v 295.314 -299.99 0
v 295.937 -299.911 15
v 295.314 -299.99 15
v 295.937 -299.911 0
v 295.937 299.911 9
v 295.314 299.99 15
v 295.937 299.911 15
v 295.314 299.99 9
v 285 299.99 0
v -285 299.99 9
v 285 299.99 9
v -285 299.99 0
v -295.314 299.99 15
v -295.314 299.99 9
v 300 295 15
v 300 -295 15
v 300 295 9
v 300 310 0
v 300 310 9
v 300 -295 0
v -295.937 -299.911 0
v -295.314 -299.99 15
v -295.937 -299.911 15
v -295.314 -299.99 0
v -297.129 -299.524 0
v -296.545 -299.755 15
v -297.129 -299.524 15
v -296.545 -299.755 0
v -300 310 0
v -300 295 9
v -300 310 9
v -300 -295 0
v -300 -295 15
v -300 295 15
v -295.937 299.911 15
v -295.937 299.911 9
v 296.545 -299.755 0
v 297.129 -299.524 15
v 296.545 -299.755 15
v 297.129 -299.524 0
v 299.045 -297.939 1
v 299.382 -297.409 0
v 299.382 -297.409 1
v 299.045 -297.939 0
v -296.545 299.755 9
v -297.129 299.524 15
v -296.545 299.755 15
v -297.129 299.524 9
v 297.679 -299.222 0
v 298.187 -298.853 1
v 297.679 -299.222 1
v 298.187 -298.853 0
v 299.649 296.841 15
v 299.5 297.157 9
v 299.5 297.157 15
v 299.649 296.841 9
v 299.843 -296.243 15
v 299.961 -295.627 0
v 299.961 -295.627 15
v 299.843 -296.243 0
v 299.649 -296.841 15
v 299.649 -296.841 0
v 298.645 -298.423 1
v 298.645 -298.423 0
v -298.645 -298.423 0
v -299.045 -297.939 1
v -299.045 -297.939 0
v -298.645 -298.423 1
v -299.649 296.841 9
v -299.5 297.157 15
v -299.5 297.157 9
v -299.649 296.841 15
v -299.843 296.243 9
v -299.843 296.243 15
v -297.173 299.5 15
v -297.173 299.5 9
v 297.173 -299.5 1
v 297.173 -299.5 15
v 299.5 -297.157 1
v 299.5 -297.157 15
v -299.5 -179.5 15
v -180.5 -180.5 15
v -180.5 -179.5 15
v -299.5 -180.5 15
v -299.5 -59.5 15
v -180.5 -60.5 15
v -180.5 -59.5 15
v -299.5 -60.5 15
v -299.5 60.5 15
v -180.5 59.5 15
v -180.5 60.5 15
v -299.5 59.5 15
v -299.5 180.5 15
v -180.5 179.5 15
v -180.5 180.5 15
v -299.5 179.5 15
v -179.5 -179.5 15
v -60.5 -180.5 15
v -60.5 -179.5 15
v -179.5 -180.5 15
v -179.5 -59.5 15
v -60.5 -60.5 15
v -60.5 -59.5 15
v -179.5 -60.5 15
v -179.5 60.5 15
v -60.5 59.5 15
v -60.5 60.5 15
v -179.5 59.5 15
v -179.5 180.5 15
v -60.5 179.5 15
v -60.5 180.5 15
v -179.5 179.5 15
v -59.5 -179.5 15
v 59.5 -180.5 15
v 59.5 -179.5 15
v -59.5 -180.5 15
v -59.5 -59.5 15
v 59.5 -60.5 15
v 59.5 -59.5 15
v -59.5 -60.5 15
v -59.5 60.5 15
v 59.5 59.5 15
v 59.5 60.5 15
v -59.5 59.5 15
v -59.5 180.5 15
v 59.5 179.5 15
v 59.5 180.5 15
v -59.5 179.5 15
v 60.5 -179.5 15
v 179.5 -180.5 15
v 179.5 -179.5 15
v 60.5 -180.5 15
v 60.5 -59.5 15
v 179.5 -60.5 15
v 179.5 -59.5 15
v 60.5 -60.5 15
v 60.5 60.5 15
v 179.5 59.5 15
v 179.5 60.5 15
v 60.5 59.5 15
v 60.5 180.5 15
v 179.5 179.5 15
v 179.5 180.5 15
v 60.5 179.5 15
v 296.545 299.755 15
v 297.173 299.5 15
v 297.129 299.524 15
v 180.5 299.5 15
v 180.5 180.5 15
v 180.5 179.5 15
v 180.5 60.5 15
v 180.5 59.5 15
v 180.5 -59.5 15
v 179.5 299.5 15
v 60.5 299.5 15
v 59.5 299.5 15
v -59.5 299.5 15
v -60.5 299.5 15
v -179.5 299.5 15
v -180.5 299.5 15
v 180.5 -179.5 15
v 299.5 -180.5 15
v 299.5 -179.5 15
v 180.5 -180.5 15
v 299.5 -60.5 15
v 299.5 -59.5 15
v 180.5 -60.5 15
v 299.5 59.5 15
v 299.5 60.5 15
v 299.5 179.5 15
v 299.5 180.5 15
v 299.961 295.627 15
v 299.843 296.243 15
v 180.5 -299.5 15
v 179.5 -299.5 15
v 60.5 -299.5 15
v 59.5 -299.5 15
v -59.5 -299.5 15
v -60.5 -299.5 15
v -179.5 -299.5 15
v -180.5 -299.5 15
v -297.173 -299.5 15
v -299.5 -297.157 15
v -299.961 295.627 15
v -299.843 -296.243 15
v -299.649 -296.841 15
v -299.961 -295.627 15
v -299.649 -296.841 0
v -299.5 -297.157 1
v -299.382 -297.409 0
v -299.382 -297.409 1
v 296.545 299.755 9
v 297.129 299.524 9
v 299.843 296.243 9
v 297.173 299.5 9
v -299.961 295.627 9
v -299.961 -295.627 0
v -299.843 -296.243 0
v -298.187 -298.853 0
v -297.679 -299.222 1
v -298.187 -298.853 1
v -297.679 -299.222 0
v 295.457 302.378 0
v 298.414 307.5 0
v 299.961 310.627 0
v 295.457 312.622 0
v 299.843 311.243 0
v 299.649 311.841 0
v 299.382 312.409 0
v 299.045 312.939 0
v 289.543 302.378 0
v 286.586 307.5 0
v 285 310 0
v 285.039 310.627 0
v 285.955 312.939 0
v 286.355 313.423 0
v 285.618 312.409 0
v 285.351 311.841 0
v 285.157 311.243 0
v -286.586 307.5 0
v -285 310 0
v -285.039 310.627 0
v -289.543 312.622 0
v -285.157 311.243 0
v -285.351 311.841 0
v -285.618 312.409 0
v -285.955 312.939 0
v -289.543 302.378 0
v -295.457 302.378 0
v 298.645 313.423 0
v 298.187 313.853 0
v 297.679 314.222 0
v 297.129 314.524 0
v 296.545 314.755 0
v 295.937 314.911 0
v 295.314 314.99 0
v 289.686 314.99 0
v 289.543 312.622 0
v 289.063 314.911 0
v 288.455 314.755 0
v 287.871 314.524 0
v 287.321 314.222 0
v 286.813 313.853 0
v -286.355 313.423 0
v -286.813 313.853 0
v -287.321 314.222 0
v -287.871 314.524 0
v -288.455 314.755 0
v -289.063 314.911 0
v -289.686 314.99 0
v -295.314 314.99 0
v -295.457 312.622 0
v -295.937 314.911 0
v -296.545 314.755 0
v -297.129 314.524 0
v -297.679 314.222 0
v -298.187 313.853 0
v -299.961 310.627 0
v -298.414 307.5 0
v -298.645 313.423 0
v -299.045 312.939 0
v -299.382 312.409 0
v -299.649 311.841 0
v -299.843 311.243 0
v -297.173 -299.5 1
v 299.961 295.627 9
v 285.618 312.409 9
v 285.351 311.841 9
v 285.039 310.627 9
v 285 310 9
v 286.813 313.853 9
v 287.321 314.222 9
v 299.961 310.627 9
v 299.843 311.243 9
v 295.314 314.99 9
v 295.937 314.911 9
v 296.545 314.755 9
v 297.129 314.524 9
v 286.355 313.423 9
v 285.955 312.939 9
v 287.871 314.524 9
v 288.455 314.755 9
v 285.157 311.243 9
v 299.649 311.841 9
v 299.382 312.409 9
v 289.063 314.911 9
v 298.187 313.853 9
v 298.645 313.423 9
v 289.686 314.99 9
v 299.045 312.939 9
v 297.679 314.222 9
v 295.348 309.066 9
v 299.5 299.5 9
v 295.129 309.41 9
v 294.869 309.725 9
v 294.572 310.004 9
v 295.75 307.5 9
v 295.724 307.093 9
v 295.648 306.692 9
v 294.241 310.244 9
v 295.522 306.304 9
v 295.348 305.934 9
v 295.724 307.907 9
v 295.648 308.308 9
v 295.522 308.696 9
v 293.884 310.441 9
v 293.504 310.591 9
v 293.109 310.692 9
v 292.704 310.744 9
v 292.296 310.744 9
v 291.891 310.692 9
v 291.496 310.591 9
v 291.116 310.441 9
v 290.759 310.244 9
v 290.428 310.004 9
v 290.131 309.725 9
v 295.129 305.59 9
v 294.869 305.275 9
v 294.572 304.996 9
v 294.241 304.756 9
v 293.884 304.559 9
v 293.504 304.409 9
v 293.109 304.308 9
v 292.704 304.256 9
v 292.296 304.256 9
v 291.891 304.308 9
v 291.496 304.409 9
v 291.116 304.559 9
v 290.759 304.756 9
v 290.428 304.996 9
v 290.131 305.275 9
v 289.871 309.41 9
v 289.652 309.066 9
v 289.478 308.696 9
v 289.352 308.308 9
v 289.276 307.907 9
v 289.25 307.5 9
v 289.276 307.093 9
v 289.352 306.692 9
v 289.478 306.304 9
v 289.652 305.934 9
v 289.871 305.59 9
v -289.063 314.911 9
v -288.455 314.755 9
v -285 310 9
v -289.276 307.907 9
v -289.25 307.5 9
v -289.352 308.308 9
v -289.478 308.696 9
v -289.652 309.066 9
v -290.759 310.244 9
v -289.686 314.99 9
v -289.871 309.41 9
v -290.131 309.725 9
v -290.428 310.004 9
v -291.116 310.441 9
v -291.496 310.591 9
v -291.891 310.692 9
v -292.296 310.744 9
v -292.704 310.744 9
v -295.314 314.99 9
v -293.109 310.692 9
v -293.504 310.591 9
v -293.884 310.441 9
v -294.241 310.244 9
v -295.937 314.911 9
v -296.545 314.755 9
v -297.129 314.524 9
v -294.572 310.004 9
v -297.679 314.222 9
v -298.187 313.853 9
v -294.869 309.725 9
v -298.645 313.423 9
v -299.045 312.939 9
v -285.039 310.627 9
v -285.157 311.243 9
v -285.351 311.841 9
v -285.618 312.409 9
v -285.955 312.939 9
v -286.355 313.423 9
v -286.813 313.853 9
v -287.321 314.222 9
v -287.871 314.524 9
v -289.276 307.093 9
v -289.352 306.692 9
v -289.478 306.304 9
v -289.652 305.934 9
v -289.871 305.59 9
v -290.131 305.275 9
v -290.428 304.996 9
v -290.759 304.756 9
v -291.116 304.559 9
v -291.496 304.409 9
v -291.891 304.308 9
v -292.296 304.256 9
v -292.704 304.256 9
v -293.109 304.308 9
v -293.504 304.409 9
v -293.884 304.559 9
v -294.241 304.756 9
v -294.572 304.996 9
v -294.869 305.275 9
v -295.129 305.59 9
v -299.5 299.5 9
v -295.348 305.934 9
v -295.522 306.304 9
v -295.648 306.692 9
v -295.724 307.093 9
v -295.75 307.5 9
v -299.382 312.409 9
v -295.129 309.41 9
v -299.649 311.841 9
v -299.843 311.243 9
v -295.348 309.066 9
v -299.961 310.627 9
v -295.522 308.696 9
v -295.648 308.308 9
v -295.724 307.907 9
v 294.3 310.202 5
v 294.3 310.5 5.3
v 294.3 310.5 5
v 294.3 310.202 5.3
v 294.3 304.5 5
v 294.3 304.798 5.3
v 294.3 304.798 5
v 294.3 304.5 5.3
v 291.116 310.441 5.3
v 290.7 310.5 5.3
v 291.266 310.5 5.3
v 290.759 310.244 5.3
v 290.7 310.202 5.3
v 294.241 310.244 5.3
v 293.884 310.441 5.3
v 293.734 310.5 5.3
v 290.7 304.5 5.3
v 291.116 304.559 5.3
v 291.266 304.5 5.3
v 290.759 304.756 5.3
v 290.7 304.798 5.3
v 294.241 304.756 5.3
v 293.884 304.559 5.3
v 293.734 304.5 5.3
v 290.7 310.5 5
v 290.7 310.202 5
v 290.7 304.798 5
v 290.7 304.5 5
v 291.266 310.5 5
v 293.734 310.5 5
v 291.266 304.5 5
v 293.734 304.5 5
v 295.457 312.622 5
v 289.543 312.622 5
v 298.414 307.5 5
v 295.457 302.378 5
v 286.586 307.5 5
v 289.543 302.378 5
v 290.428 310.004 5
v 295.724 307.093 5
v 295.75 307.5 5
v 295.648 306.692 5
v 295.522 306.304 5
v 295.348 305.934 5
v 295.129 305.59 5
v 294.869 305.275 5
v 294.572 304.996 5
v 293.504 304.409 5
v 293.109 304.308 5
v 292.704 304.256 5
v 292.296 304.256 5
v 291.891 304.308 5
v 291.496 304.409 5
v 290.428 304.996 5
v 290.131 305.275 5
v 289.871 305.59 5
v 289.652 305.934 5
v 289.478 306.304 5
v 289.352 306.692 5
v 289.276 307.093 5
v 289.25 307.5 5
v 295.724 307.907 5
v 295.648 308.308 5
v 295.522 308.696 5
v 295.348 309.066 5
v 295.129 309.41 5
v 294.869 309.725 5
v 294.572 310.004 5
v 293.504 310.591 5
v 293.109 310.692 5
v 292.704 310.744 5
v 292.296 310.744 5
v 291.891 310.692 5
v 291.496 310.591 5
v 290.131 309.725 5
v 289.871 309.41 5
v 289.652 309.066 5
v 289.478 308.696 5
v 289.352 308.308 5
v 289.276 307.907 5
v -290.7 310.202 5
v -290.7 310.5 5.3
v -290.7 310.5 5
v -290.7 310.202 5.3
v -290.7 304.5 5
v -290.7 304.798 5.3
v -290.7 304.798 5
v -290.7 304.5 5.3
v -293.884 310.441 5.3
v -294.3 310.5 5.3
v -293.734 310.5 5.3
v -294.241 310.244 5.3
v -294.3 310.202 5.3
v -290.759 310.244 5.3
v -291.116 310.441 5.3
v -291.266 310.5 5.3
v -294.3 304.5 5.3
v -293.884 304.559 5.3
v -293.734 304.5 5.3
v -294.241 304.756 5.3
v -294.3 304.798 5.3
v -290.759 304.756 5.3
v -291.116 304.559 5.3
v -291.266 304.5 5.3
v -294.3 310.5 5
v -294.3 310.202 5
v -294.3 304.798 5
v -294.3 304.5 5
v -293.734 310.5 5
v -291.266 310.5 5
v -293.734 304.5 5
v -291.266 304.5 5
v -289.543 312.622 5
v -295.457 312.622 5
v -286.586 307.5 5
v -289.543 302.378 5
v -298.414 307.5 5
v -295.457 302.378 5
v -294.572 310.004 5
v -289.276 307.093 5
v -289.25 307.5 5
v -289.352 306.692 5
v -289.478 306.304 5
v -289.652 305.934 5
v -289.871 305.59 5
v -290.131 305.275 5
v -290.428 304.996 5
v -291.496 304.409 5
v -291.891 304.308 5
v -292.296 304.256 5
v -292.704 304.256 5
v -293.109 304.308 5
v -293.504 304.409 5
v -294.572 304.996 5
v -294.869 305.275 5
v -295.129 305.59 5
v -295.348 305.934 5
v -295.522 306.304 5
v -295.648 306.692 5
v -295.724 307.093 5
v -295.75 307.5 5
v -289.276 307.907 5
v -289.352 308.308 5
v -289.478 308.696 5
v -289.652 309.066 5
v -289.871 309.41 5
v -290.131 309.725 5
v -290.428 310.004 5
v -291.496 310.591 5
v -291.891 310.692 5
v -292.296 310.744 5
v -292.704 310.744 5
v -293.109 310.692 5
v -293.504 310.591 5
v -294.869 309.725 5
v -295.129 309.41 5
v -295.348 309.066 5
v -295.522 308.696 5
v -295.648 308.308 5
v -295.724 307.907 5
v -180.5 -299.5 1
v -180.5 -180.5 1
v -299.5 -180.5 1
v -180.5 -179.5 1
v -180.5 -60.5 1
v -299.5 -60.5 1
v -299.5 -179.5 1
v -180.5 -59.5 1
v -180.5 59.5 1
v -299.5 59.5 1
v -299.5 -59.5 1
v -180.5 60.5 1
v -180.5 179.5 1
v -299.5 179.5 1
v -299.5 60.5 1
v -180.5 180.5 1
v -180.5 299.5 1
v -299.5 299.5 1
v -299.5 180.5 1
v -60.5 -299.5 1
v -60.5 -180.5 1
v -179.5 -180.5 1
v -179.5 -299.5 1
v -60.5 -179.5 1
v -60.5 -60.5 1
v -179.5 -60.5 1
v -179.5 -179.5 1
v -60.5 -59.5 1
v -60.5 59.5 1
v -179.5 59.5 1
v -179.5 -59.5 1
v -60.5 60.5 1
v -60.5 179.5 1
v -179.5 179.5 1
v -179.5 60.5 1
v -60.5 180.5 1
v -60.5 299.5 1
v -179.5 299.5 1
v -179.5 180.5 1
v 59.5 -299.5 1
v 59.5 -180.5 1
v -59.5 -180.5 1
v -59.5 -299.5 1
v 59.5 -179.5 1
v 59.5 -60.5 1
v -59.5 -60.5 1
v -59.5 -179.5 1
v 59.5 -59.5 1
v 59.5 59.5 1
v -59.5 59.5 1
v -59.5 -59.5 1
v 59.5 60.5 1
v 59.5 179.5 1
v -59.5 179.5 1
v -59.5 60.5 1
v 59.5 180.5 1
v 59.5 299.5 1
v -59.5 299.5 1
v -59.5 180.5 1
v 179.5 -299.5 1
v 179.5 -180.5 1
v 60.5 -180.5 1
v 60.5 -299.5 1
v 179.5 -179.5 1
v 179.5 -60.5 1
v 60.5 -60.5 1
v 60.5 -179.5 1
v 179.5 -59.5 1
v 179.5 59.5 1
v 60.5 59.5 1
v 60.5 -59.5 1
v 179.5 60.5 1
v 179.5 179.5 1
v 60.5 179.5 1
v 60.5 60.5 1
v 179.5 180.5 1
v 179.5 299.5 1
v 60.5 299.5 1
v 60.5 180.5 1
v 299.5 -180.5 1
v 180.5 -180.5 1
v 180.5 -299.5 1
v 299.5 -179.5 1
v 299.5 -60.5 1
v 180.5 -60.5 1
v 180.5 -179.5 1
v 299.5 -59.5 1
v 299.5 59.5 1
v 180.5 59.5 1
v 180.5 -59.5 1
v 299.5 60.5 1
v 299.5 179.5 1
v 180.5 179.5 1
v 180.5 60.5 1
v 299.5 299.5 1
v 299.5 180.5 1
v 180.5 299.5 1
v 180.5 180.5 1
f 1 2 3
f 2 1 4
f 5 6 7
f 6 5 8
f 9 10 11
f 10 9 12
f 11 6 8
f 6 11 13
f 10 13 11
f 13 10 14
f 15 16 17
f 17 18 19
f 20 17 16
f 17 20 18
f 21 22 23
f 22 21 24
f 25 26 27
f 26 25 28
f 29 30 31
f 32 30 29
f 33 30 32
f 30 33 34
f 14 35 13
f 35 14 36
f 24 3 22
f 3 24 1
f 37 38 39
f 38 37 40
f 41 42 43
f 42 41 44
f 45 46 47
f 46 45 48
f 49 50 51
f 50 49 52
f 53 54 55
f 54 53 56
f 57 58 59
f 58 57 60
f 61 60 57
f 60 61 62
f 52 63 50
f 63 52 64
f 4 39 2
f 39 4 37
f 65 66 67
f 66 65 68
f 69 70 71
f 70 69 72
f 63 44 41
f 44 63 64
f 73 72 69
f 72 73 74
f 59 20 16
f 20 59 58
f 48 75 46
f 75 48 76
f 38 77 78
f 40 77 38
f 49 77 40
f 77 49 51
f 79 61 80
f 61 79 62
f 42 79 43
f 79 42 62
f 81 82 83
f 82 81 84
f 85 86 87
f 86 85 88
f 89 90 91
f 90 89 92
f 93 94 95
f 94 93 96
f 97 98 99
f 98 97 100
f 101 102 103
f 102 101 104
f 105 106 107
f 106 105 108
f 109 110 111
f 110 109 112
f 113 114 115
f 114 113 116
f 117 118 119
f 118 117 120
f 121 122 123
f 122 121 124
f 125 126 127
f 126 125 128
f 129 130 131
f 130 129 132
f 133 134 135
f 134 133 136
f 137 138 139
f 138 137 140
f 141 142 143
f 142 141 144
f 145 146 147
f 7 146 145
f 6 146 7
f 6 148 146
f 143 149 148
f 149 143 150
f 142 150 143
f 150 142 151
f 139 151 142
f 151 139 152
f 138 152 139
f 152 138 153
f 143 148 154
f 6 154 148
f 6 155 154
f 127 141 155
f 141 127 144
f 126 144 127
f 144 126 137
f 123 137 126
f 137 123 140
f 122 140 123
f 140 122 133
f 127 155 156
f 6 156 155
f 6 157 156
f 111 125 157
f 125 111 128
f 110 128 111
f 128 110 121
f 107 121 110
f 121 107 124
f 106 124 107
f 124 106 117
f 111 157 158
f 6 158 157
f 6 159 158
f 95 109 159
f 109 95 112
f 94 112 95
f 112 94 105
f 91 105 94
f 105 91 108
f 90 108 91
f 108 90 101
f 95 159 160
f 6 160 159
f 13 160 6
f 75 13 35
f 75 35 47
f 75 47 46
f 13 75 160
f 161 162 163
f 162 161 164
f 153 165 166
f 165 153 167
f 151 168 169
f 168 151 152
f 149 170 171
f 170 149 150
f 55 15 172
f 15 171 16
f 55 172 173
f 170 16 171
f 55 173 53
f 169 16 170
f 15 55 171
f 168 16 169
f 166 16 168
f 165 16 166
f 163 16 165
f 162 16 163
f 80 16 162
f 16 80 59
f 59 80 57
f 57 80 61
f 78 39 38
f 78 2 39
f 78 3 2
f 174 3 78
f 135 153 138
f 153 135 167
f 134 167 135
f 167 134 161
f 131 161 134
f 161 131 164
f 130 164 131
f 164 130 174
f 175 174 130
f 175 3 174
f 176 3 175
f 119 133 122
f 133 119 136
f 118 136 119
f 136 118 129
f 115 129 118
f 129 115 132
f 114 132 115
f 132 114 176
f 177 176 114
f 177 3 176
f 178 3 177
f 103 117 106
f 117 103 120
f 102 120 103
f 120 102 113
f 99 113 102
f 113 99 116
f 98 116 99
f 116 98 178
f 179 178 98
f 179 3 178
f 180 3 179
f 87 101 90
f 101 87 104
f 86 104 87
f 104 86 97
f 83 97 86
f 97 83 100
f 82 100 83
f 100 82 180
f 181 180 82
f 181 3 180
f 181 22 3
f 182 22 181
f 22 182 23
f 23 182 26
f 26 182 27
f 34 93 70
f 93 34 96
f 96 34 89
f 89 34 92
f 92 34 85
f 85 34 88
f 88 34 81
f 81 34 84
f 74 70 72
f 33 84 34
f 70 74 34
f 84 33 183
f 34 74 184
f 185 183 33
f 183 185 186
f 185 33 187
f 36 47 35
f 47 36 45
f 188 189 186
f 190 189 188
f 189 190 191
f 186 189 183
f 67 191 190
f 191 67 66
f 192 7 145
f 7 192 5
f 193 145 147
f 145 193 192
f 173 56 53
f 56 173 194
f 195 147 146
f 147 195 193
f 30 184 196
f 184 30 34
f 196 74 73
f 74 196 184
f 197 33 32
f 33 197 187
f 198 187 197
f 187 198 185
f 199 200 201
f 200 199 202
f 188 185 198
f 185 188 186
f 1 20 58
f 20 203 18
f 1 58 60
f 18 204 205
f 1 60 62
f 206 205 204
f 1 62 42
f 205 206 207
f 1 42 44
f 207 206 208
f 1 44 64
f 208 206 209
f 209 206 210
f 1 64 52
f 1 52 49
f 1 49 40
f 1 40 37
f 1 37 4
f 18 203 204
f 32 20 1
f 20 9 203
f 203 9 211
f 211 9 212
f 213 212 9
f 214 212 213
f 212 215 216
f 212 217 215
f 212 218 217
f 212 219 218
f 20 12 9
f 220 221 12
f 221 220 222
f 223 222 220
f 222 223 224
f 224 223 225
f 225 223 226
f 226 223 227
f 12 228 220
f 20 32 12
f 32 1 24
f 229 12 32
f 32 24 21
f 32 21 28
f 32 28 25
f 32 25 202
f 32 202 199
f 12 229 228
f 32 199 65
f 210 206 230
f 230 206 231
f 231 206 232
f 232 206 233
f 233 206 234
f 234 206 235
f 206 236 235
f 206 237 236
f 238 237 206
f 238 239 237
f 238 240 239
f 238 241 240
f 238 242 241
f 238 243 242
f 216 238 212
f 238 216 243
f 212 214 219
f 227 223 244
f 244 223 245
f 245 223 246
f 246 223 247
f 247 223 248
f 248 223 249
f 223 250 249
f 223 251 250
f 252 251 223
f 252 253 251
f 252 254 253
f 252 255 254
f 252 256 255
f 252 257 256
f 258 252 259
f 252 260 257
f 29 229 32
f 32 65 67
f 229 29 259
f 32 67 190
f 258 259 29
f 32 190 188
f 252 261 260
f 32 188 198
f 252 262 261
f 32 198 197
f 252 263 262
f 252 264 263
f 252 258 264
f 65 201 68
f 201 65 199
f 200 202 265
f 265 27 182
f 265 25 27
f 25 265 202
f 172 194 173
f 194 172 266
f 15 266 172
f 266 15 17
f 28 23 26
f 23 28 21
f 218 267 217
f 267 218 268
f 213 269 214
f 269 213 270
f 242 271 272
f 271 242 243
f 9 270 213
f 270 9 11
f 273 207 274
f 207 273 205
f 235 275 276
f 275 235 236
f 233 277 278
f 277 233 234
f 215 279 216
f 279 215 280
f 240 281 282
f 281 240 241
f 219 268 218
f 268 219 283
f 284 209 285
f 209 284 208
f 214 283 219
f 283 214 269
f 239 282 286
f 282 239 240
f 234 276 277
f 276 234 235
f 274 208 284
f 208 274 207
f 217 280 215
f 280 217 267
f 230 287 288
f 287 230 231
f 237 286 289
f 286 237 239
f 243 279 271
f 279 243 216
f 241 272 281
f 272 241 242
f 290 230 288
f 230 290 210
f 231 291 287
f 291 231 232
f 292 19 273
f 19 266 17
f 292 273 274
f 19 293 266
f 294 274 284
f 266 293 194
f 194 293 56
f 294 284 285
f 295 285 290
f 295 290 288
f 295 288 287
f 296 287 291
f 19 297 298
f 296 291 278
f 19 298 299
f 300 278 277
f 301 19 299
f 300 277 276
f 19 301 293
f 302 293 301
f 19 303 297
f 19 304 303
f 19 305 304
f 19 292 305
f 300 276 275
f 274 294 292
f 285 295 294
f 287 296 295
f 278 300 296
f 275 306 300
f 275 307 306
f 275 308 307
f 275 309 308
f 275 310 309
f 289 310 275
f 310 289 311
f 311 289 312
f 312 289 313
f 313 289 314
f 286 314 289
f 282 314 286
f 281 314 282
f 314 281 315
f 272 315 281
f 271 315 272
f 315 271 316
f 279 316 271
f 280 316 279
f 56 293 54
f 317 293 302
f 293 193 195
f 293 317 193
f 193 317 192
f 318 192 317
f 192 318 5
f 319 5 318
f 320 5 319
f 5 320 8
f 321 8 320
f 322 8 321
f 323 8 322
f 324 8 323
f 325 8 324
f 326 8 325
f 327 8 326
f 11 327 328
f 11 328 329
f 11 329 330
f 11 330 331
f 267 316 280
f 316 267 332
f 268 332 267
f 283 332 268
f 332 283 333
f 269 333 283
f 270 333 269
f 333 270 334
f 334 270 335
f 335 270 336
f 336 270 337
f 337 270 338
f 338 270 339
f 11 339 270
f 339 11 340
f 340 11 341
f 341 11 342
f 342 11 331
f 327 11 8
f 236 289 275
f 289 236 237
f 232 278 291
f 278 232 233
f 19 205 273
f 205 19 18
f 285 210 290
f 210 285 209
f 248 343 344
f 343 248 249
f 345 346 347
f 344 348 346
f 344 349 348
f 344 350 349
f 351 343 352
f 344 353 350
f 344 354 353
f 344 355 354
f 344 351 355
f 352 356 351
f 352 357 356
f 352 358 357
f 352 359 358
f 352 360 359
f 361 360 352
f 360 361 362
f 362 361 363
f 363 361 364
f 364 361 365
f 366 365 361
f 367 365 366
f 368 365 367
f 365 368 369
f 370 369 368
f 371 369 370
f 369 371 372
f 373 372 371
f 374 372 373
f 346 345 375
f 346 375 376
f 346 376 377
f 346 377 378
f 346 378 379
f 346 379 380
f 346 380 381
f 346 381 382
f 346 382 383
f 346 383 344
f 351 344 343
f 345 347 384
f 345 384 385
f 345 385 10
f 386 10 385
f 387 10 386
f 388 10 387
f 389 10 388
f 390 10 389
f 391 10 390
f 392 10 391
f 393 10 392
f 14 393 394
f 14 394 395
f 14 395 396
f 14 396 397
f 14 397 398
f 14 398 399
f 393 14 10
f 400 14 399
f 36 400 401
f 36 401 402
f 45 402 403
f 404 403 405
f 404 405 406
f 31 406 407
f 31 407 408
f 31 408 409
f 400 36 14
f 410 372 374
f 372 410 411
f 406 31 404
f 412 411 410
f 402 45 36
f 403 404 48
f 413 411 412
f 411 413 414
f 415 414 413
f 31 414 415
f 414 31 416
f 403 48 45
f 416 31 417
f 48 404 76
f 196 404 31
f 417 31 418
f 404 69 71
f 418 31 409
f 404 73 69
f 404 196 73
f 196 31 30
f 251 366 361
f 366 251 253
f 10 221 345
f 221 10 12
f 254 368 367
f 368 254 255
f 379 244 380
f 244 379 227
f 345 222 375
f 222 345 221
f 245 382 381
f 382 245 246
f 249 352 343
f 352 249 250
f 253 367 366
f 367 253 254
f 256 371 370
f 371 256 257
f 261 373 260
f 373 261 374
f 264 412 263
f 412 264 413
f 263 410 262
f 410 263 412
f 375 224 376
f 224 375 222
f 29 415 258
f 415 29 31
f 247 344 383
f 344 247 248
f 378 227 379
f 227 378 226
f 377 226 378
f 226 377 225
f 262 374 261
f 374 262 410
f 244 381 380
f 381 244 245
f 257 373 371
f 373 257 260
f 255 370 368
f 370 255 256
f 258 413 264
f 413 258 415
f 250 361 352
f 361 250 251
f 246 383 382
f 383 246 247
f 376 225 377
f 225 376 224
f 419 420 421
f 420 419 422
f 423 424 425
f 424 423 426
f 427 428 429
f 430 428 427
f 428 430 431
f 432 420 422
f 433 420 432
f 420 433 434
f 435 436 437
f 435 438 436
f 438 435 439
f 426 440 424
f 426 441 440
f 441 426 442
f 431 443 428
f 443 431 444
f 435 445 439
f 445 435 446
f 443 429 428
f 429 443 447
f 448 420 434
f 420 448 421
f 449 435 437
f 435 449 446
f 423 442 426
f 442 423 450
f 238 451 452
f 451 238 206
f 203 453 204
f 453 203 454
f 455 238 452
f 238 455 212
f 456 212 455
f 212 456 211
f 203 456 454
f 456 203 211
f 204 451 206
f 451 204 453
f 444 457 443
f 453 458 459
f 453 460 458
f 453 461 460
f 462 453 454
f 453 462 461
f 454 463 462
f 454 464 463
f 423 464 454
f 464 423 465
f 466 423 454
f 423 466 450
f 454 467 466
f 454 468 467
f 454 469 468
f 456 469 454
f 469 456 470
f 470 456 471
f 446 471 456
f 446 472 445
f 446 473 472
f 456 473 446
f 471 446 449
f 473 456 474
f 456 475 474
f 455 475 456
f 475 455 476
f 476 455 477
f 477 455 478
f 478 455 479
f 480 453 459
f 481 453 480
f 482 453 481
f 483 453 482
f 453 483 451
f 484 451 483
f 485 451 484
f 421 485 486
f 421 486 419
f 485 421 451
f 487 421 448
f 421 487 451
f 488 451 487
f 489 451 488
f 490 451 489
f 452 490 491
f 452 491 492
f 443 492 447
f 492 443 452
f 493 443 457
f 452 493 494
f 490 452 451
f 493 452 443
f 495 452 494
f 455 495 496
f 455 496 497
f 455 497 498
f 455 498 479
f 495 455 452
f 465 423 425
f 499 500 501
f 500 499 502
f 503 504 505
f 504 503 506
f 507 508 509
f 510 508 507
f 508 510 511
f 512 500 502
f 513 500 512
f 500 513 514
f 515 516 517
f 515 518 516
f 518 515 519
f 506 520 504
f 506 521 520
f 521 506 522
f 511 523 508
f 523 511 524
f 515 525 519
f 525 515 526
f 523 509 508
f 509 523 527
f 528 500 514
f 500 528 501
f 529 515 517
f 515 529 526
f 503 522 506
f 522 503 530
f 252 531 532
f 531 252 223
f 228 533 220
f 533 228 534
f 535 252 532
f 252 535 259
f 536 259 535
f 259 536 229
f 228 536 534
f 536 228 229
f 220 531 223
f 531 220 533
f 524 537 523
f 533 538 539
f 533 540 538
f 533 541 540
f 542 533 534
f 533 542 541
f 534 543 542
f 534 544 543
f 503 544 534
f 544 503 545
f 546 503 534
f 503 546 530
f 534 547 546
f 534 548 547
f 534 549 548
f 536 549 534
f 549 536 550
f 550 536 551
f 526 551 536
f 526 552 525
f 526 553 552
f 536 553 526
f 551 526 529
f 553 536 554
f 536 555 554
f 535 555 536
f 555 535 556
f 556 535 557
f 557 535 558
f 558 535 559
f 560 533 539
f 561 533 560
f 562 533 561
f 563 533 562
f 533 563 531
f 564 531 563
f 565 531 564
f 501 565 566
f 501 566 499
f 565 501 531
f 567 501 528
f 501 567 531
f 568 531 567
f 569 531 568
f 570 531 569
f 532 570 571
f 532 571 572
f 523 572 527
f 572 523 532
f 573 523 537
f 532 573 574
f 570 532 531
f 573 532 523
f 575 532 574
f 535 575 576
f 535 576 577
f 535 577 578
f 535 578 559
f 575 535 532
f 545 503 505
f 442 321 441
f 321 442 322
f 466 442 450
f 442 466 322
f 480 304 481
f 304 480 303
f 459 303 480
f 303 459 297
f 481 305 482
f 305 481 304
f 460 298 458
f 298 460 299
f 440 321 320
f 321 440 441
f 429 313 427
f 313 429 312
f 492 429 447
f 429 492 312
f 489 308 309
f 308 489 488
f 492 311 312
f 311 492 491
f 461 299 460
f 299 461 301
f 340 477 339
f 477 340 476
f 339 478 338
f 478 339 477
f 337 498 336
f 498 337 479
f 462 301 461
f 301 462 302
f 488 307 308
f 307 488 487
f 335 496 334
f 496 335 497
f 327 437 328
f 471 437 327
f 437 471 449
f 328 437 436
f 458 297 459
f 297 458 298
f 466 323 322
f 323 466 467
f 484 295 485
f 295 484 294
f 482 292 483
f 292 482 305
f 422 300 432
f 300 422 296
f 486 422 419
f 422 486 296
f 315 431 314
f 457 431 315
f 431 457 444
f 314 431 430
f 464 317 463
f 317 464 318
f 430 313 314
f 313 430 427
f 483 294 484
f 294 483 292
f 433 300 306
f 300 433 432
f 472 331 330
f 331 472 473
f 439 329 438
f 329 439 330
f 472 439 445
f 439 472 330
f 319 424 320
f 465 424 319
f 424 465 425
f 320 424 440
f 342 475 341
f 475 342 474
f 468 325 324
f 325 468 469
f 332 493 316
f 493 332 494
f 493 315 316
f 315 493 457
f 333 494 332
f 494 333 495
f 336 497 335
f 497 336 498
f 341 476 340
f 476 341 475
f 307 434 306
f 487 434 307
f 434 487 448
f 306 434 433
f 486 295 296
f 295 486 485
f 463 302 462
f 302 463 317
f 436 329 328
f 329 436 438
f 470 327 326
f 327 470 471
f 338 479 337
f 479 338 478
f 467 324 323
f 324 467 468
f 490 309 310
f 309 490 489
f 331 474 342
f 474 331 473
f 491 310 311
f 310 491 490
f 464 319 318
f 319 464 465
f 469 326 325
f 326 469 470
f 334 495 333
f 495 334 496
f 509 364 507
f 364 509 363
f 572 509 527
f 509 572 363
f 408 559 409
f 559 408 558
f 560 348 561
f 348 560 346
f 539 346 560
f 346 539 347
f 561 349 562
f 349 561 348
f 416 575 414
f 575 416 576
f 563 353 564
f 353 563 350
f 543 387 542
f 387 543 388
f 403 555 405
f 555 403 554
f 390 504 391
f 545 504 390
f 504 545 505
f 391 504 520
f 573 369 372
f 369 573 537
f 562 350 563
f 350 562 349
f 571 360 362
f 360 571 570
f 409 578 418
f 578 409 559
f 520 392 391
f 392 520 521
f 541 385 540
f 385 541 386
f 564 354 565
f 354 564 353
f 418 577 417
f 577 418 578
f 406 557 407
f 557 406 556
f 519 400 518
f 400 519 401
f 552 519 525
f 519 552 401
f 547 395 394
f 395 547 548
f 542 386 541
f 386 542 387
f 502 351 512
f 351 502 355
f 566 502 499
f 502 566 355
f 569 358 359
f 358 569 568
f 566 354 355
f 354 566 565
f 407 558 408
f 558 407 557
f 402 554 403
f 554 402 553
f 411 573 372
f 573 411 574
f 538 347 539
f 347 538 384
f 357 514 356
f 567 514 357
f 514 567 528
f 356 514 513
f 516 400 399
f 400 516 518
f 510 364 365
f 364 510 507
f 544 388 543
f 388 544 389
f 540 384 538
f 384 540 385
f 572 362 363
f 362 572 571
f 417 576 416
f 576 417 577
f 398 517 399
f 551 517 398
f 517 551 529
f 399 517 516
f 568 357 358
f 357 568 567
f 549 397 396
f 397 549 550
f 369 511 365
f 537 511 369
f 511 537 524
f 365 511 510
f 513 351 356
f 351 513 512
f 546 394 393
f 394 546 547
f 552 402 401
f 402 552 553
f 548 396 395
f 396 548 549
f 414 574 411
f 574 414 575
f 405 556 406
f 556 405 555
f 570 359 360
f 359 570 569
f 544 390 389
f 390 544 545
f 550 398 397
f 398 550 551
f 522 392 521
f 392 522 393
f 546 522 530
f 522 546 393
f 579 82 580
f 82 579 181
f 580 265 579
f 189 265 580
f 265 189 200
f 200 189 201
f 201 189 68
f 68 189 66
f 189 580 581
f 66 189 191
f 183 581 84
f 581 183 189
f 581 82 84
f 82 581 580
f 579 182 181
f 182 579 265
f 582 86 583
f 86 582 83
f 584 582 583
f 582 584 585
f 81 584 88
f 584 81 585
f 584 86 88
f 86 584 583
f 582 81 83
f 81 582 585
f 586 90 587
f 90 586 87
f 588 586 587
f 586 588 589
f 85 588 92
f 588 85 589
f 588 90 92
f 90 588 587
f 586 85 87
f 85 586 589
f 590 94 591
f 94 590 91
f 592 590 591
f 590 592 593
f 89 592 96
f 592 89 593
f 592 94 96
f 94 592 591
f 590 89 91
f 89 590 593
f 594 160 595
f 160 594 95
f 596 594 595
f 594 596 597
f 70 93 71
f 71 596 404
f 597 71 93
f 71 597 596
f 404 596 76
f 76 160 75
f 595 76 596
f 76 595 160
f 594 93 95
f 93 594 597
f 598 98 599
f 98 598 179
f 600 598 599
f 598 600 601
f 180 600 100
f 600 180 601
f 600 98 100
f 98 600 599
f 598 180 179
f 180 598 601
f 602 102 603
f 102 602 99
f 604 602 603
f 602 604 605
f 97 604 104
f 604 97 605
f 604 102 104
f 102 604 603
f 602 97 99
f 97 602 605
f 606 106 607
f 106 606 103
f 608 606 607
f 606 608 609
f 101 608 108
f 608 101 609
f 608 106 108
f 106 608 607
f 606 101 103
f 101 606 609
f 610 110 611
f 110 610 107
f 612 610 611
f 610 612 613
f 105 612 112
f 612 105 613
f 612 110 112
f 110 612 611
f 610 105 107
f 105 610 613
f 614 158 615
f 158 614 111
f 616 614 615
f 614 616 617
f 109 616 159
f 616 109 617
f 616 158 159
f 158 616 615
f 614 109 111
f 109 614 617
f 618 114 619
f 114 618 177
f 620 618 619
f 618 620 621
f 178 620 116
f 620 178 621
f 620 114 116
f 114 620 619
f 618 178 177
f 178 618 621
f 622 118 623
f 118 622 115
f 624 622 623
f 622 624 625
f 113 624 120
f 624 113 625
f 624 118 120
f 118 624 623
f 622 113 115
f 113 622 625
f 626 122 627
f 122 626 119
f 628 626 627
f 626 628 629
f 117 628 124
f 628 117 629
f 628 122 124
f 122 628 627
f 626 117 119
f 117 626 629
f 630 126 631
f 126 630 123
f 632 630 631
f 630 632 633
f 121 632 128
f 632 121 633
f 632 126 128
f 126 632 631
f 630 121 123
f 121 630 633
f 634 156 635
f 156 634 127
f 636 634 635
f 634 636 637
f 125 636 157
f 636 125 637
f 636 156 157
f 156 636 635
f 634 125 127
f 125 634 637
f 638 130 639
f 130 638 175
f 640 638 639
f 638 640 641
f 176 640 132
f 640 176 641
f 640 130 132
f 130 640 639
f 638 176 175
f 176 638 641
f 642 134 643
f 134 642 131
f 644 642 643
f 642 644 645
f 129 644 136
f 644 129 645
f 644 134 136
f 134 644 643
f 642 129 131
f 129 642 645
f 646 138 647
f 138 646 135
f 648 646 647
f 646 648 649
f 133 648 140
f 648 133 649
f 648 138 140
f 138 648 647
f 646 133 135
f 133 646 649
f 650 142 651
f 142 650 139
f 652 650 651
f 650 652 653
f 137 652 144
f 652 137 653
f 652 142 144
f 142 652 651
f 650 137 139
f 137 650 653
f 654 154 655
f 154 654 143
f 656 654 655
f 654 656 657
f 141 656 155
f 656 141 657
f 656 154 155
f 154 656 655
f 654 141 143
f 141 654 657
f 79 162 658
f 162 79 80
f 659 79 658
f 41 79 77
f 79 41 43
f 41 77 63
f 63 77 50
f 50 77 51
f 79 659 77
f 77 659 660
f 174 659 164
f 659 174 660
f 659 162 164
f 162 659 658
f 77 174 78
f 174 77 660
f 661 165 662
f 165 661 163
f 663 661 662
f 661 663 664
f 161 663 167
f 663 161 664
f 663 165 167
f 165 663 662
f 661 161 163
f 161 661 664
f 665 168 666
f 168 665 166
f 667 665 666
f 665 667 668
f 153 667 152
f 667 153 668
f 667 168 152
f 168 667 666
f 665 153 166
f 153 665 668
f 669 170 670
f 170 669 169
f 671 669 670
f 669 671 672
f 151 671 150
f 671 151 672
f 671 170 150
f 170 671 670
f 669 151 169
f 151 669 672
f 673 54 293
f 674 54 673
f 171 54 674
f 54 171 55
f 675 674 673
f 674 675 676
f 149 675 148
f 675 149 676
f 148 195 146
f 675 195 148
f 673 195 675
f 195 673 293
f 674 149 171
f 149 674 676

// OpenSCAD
$fn = 50;


difference() {
	union() {
		hull() {
			translate(v = [-295.0000000000, 295.0000000000, 0]) {
				cylinder(h = 15, r = 5);
			}
			translate(v = [295.0000000000, 295.0000000000, 0]) {
				cylinder(h = 15, r = 5);
			}
			translate(v = [-295.0000000000, -295.0000000000, 0]) {
				cylinder(h = 15, r = 5);
			}
			translate(v = [295.0000000000, -295.0000000000, 0]) {
				cylinder(h = 15, r = 5);
			}
		}
		translate(v = [292.5000000000, 7.5000000000, 0]) {
			hull() {
				translate(v = [-2.5000000000, 302.5000000000, 0]) {
					cylinder(h = 9, r = 5);
				}
				translate(v = [2.5000000000, 302.5000000000, 0]) {
					cylinder(h = 9, r = 5);
				}
				translate(v = [-2.5000000000, -302.5000000000, 0]) {
					cylinder(h = 9, r = 5);
				}
				translate(v = [2.5000000000, -302.5000000000, 0]) {
					cylinder(h = 9, r = 5);
				}
			}
		}
		translate(v = [-292.5000000000, 7.5000000000, 0]) {
			hull() {
				translate(v = [-2.5000000000, 302.5000000000, 0]) {
					cylinder(h = 9, r = 5);
				}
				translate(v = [2.5000000000, 302.5000000000, 0]) {
					cylinder(h = 9, r = 5);
				}
				translate(v = [-2.5000000000, -302.5000000000, 0]) {
					cylinder(h = 9, r = 5);
				}
				translate(v = [2.5000000000, -302.5000000000, 0]) {
					cylinder(h = 9, r = 5);
				}
			}
		}
	}
	union() {
		translate(v = [292.5000000000, 307.5000000000, 0]) {
			rotate(a = [0, 0, 0]) {
				difference() {
					union() {
						translate(v = [-1.8000000000, -3.0000000000, -0.3000000000]) {
							cube(size = [3.6000000000, 6.0000000000, 0.3000000000]);
						}
						translate(v = [-1.8000000000, -1.8000000000, -0.6000000000]) {
							cube(size = [3.6000000000, 3.6000000000, 0.3000000000]);
						}
						translate(v = [-1.8000000000, -3.0000000000, 5]) {
							cube(size = [3.6000000000, 6.0000000000, 0.3000000000]);
						}
						translate(v = [-1.8000000000, -1.8000000000, 5.3000000000]) {
							cube(size = [3.6000000000, 3.6000000000, 0.3000000000]);
						}
						linear_extrude(height = 5) {
							polygon(points = [[5.9142500000, 0.0000000000], [2.9571250000, 5.1218907443], [-2.9571250000, 5.1218907443], [-5.9142500000, 0.0000000000], [-2.9571250000, -5.1218907443], [2.9571250000, -5.1218907443]]);
						}
						translate(v = [-1.8000000000, -3.0000000000, -0.3000000000]) {
							cube(size = [3.6000000000, 6.0000000000, 0.3000000000]);
						}
						translate(v = [-1.8000000000, -1.8000000000, -0.6000000000]) {
							cube(size = [3.6000000000, 3.6000000000, 0.3000000000]);
						}
						translate(v = [-1.8000000000, -3.0000000000, 5]) {
							cube(size = [3.6000000000, 6.0000000000, 0.3000000000]);
						}
						translate(v = [-1.8000000000, -1.8000000000, 5.3000000000]) {
							cube(size = [3.6000000000, 3.6000000000, 0.3000000000]);
						}
						translate(v = [-1.8000000000, -3.0000000000, -0.3000000000]) {
							cube(size = [3.6000000000, 6.0000000000, 0.3000000000]);
						}
						translate(v = [-1.8000000000, -1.8000000000, -0.6000000000]) {
							cube(size = [3.6000000000, 3.6000000000, 0.3000000000]);
						}
						translate(v = [-1.8000000000, -3.0000000000, 5]) {
							cube(size = [3.6000000000, 6.0000000000, 0.3000000000]);
						}
						translate(v = [-1.8000000000, -1.8000000000, 5.3000000000]) {
							cube(size = [3.6000000000, 3.6000000000, 0.3000000000]);
						}
					}
					union();
				}
			}
		}
		translate(v = [-292.5000000000, 307.5000000000, 0]) {
			rotate(a = [0, 0, 0]) {
				difference() {
					union() {
						translate(v = [-1.8000000000, -3.0000000000, -0.3000000000]) {
							cube(size = [3.6000000000, 6.0000000000, 0.3000000000]);
						}
						translate(v = [-1.8000000000, -1.8000000000, -0.6000000000]) {
							cube(size = [3.6000000000, 3.6000000000, 0.3000000000]);
						}
						translate(v = [-1.8000000000, -3.0000000000, 5]) {
							cube(size = [3.6000000000, 6.0000000000, 0.3000000000]);
						}
						translate(v = [-1.8000000000, -1.8000000000, 5.3000000000]) {
							cube(size = [3.6000000000, 3.6000000000, 0.3000000000]);
						}
						linear_extrude(height = 5) {
							polygon(points = [[5.9142500000, 0.0000000000], [2.9571250000, 5.1218907443], [-2.9571250000, 5.1218907443], [-5.9142500000, 0.0000000000], [-2.9571250000, -5.1218907443], [2.9571250000, -5.1218907443]]);
						}
						translate(v = [-1.8000000000, -3.0000000000, -0.3000000000]) {
							cube(size = [3.6000000000, 6.0000000000, 0.3000000000]);
						}
						translate(v = [-1.8000000000, -1.8000000000, -0.6000000000]) {
							cube(size = [3.6000000000, 3.6000000000, 0.3000000000]);
						}
						translate(v = [-1.8000000000, -3.0000000000, 5]) {
							cube(size = [3.6000000000, 6.0000000000, 0.3000000000]);
						}
						translate(v = [-1.8000000000, -1.8000000000, 5.3000000000]) {
							cube(size = [3.6000000000, 3.6000000000, 0.3000000000]);
						}
						translate(v = [-1.8000000000, -3.0000000000, -0.3000000000]) {
							cube(size = [3.6000000000, 6.0000000000, 0.3000000000]);
						}
						translate(v = [-1.8000000000, -1.8000000000, -0.6000000000]) {
							cube(size = [3.6000000000, 3.6000000000, 0.3000000000]);
						}
						translate(v = [-1.8000000000, -3.0000000000, 5]) {
							cube(size = [3.6000000000, 6.0000000000, 0.3000000000]);
						}
						translate(v = [-1.8000000000, -1.8000000000, 5.3000000000]) {
							cube(size = [3.6000000000, 3.6000000000, 0.3000000000]);
						}
					}
					union();
				}
			}
		}
		translate(v = [292.5000000000, 307.5000000000, -100.0000000000]) {
			cylinder(h = 200, r = 3.2500000000);
		}
		translate(v = [-292.5000000000, 307.5000000000, -100.0000000000]) {
			cylinder(h = 200, r = 3.2500000000);
		}
		#translate(v = [-299.5000000000, -299.5000000000, 1]) {
			cube(size = [119, 119, 30]);
		}
		#translate(v = [-299.5000000000, -179.5000000000, 1]) {
			cube(size = [119, 119, 30]);
		}
		#translate(v = [-299.5000000000, -59.5000000000, 1]) {
			cube(size = [119, 119, 30]);
		}
		#translate(v = [-299.5000000000, 60.5000000000, 1]) {
			cube(size = [119, 119, 30]);
		}
		#translate(v = [-299.5000000000, 180.5000000000, 1]) {
			cube(size = [119, 119, 30]);
		}
		#translate(v = [-179.5000000000, -299.5000000000, 1]) {
			cube(size = [119, 119, 30]);
		}
		#translate(v = [-179.5000000000, -179.5000000000, 1]) {
			cube(size = [119, 119, 30]);
		}
		#translate(v = [-179.5000000000, -59.5000000000, 1]) {
			cube(size = [119, 119, 30]);
		}
		#translate(v = [-179.5000000000, 60.5000000000, 1]) {
			cube(size = [119, 119, 30]);
		}
		#translate(v = [-179.5000000000, 180.5000000000, 1]) {
			cube(size = [119, 119, 30]);
		}
		#translate(v = [-59.5000000000, -299.5000000000, 1]) {
			cube(size = [119, 119, 30]);
		}
		#translate(v = [-59.5000000000, -179.5000000000, 1]) {
			cube(size = [119, 119, 30]);
		}
		#translate(v = [-59.5000000000, -59.5000000000, 1]) {
			cube(size = [119, 119, 30]);
		}
		#translate(v = [-59.5000000000, 60.5000000000, 1]) {
			cube(size = [119, 119, 30]);
		}
		#translate(v = [-59.5000000000, 180.5000000000, 1]) {
			cube(size = [119, 119, 30]);
		}
		#translate(v = [60.5000000000, -299.5000000000, 1]) {
			cube(size = [119, 119, 30]);
		}
		#translate(v = [60.5000000000, -179.5000000000, 1]) {
			cube(size = [119, 119, 30]);
		}
		#translate(v = [60.5000000000, -59.5000000000, 1]) {
			cube(size = [119, 119, 30]);
		}
		#translate(v = [60.5000000000, 60.5000000000, 1]) {
			cube(size = [119, 119, 30]);
		}
		#translate(v = [60.5000000000, 180.5000000000, 1]) {
			cube(size = [119, 119, 30]);
		}
		#translate(v = [180.5000000000, -299.5000000000, 1]) {
			cube(size = [119, 119, 30]);
		}
		#translate(v = [180.5000000000, -179.5000000000, 1]) {
			cube(size = [119, 119, 30]);
		}
		#translate(v = [180.5000000000, -59.5000000000, 1]) {
			cube(size = [119, 119, 30]);
		}
		#translate(v = [180.5000000000, 60.5000000000, 1]) {
			cube(size = [119, 119, 30]);
		}
		#translate(v = [180.5000000000, 180.5000000000, 1]) {
			cube(size = [119, 119, 30]);
		}
	}
}
